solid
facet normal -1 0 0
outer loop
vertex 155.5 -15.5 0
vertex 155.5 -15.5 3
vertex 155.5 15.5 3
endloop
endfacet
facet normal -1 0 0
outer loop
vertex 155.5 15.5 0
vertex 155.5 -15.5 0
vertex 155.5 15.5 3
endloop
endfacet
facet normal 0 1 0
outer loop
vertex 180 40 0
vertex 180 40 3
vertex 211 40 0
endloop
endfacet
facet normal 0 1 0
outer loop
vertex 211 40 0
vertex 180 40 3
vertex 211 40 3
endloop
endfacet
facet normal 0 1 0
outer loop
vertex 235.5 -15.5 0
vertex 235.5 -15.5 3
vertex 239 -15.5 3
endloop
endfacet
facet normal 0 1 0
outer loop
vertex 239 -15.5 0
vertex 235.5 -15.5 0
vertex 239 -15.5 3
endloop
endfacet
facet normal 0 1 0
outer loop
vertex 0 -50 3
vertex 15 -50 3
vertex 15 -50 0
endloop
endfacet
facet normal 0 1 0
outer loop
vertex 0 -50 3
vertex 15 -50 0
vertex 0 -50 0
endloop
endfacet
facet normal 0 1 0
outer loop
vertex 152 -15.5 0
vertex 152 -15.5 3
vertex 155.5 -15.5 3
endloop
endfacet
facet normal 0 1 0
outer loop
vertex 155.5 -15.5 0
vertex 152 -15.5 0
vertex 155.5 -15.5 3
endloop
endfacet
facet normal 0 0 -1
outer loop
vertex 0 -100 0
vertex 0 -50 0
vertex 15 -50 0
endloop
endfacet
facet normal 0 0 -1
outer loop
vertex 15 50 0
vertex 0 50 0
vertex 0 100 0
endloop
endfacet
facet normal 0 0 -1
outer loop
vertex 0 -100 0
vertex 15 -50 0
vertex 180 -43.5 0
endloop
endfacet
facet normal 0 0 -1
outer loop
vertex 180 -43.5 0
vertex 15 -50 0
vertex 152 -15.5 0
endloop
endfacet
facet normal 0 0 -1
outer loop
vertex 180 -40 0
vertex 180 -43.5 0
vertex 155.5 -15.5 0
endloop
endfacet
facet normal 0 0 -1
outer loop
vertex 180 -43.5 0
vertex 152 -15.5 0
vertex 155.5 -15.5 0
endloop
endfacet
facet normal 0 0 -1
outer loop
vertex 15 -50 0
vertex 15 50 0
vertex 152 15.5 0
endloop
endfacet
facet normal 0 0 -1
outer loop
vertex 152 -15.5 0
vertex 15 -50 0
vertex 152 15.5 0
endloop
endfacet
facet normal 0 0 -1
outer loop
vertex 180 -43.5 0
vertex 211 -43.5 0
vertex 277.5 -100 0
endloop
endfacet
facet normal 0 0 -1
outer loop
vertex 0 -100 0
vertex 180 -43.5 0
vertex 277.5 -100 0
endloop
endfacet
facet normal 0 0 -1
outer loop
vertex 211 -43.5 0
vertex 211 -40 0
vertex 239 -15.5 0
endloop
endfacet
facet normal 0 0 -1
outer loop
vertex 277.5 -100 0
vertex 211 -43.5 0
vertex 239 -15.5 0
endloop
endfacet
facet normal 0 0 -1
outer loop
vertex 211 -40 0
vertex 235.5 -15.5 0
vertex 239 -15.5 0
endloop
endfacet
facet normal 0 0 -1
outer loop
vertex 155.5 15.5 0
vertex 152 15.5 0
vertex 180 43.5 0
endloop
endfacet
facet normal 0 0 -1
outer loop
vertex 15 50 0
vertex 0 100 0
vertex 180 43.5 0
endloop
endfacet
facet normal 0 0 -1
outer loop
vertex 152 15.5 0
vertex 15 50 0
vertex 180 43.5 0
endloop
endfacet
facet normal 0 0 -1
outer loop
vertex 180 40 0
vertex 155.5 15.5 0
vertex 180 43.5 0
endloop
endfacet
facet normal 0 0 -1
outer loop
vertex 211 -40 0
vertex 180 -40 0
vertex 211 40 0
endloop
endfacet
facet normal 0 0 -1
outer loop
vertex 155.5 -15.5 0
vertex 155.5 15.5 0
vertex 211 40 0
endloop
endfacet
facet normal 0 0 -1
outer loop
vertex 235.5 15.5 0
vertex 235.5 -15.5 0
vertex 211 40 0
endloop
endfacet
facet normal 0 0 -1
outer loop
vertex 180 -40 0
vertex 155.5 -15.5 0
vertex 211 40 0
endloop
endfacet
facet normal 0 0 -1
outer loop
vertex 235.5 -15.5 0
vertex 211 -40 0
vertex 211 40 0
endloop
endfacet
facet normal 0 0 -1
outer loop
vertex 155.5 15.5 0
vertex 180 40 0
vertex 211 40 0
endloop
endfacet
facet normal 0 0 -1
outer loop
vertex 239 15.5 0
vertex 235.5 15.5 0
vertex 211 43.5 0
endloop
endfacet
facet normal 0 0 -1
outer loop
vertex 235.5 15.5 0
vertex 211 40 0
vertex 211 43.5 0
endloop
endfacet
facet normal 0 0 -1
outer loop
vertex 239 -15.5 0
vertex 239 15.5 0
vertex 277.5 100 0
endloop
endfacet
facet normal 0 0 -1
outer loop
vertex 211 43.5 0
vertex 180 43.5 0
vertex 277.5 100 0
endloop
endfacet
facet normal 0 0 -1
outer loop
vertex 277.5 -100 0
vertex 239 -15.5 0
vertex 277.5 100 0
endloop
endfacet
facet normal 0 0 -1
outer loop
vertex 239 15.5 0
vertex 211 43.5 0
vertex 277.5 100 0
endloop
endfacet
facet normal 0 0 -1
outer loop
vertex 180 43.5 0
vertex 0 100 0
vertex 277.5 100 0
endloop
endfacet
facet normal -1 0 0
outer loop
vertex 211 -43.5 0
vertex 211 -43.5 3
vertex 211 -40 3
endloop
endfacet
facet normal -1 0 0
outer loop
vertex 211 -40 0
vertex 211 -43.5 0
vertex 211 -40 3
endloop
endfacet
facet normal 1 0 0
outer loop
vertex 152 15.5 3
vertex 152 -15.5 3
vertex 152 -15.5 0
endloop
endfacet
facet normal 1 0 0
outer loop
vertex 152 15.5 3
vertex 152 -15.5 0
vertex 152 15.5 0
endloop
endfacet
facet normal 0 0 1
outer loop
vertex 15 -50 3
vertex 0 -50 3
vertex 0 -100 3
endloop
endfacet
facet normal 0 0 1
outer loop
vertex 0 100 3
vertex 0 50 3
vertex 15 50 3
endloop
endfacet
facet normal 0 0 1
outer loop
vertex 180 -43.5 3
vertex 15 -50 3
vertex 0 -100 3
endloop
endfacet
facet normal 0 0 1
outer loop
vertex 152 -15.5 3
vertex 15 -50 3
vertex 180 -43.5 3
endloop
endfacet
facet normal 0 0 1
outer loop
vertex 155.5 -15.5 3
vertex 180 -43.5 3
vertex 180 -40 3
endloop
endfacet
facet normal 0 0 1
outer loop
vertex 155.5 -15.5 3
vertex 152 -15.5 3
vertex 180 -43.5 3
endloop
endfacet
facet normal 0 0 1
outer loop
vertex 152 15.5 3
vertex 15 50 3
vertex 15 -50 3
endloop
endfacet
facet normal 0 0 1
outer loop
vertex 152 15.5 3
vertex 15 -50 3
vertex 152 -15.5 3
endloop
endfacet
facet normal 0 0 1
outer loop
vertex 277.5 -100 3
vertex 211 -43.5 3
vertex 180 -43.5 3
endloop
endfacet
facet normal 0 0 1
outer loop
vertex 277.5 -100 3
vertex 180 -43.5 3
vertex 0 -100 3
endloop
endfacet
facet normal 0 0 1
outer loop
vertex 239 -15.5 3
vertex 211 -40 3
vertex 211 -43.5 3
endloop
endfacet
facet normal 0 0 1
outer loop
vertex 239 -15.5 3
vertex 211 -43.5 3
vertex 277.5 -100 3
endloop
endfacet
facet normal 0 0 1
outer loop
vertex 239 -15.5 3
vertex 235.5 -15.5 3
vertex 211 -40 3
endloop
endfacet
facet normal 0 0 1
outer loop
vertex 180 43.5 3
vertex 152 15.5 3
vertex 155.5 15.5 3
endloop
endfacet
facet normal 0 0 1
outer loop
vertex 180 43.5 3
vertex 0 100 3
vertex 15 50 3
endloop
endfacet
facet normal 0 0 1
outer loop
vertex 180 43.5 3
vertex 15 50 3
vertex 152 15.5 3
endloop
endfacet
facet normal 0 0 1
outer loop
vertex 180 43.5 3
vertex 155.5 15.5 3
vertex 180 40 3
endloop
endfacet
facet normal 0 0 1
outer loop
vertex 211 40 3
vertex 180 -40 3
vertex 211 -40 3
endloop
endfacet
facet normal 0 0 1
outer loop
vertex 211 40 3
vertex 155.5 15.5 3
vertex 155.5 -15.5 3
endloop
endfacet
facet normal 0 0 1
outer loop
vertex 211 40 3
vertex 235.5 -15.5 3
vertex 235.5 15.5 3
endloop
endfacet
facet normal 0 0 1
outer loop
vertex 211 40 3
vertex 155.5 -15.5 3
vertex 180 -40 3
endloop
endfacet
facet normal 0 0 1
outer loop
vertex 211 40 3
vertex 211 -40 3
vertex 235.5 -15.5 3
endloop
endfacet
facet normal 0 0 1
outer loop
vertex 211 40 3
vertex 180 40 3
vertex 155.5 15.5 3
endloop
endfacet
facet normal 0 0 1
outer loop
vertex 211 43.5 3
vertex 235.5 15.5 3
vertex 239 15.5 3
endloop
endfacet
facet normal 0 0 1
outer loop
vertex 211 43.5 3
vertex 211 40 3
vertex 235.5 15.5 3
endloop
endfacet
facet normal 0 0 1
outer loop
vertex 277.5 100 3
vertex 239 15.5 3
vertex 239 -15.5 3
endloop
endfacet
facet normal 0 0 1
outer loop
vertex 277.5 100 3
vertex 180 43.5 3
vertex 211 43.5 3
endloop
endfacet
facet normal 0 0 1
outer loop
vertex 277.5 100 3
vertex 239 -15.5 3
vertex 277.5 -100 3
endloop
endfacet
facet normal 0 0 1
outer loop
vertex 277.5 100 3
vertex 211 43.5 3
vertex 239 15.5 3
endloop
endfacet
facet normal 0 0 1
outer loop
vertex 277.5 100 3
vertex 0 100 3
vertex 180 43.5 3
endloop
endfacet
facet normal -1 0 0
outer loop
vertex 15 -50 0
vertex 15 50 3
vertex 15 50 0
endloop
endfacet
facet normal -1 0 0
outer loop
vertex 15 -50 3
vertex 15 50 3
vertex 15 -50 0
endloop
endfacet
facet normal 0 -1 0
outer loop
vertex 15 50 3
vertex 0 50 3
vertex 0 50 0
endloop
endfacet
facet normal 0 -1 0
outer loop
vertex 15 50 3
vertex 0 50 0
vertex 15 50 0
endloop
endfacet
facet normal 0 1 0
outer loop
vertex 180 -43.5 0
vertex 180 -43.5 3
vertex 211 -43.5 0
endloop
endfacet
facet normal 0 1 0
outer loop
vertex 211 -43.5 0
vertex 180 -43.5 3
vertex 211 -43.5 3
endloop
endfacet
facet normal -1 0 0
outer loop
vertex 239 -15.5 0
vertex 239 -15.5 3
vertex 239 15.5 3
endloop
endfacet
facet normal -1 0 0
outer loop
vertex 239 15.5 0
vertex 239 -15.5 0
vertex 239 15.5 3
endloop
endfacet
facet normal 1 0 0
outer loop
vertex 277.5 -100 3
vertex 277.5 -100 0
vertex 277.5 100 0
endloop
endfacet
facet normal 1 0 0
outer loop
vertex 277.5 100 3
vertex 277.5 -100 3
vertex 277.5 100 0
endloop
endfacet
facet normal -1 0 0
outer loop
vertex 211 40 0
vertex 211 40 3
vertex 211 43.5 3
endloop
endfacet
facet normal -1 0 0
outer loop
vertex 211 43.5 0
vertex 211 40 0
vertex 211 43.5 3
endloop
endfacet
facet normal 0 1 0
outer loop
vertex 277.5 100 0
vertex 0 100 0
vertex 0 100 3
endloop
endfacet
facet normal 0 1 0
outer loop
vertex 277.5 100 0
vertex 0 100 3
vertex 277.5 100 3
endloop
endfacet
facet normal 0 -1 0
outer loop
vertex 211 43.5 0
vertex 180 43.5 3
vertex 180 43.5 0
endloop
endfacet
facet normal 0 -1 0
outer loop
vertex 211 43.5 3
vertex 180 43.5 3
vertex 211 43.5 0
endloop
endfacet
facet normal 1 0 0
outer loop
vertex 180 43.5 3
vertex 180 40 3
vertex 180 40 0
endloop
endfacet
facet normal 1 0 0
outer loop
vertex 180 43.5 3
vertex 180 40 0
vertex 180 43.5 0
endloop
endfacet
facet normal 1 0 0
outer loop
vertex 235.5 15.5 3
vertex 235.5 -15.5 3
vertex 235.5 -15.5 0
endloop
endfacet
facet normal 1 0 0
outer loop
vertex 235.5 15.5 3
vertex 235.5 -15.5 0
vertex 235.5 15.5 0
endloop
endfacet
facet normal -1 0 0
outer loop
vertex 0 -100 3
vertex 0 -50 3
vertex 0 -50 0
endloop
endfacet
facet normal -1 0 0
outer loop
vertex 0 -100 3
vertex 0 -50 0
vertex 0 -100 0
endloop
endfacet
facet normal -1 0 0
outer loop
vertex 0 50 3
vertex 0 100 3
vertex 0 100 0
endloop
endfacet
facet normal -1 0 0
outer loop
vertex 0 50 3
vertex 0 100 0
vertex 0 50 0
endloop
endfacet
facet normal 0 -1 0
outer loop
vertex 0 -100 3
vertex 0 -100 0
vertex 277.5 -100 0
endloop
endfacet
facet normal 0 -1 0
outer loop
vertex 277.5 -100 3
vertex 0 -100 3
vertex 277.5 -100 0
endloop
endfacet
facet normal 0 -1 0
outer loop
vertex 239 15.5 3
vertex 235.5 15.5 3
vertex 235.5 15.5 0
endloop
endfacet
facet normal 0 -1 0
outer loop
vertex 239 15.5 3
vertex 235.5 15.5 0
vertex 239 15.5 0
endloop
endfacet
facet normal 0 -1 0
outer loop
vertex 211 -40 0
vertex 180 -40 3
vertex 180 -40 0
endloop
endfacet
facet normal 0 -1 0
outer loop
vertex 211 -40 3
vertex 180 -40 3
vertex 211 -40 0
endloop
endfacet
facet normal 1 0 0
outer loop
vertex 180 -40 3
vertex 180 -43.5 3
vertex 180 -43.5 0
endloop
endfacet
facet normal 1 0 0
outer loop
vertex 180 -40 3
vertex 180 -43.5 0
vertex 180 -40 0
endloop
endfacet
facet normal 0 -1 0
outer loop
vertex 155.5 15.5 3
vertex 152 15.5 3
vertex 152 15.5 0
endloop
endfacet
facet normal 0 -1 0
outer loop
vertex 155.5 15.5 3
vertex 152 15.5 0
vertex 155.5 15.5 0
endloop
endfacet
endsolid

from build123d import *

# Parameters (mm, degrees)
ESBO_O1_W                = 555
ESBO_O1_H                = 200
RESSALTO_EXTRUS_O1_DEPTH = 3
ESBO_O2_W                = 3.5
ESBO_O2_H                = 31
ESBO_O2_W_2              = 31
ESBO_O2_H_2              = 3.5
CORTE_EXTRUS_O1_DEPTH    = 295.983474113
ESBO_O3_OUTSIDE_W        = 674.988
ESBO_O3_OUTSIDE_H        = 319.988
CORTE_EXTRUS_O3_DEPTH    = 295.983474113


with BuildPart() as part:
    # Esboço1 → Ressalto-extrusão1 (new body)
    with BuildSketch(Plane.XY):
        Rectangle(ESBO_O1_W, ESBO_O1_H)
    extrude(amount=RESSALTO_EXTRUS_O1_DEPTH)

    # Esboço2 → Corte-extrusão1 (cut, through all)
    with BuildSketch(Plane.XY.offset(3)):
        with Locations((237.25, 0)):
            Rectangle(ESBO_O2_W, ESBO_O2_H)
        with Locations((-153.75, 0)):
            Rectangle(ESBO_O2_W, ESBO_O2_H)
        with Locations((-237.25, 0)):
            Rectangle(ESBO_O2_W, ESBO_O2_H)
        with Locations((-195.5, 41.75)):
            Rectangle(ESBO_O2_W_2, ESBO_O2_H_2)
        with Locations((-195.5, -41.75)):
            Rectangle(ESBO_O2_W_2, ESBO_O2_H_2)
        with Locations((153.75, 0)):
            Rectangle(ESBO_O2_W, ESBO_O2_H)
        with Locations((195.5, -41.75)):
            Rectangle(ESBO_O2_W_2, ESBO_O2_H_2)
        with Locations((195.5, 41.75)):
            Rectangle(ESBO_O2_W_2, ESBO_O2_H_2)
    extrude(amount=-CORTE_EXTRUS_O1_DEPTH, mode=Mode.SUBTRACT)

    # Esboço3 outside → Corte-extrusão3 (cut, through all)
    with BuildSketch(Plane.XY.offset(3)):
        Rectangle(ESBO_O3_OUTSIDE_W, ESBO_O3_OUTSIDE_H)
        Polygon((0, 100), (0, 50), (15, 50), (15, -50), (0, -50), (0, -100), (277.5, -100), (277.5, 100), align=None, mode=Mode.SUBTRACT)
    extrude(amount=-CORTE_EXTRUS_O3_DEPTH, mode=Mode.SUBTRACT)


solid = part.part
